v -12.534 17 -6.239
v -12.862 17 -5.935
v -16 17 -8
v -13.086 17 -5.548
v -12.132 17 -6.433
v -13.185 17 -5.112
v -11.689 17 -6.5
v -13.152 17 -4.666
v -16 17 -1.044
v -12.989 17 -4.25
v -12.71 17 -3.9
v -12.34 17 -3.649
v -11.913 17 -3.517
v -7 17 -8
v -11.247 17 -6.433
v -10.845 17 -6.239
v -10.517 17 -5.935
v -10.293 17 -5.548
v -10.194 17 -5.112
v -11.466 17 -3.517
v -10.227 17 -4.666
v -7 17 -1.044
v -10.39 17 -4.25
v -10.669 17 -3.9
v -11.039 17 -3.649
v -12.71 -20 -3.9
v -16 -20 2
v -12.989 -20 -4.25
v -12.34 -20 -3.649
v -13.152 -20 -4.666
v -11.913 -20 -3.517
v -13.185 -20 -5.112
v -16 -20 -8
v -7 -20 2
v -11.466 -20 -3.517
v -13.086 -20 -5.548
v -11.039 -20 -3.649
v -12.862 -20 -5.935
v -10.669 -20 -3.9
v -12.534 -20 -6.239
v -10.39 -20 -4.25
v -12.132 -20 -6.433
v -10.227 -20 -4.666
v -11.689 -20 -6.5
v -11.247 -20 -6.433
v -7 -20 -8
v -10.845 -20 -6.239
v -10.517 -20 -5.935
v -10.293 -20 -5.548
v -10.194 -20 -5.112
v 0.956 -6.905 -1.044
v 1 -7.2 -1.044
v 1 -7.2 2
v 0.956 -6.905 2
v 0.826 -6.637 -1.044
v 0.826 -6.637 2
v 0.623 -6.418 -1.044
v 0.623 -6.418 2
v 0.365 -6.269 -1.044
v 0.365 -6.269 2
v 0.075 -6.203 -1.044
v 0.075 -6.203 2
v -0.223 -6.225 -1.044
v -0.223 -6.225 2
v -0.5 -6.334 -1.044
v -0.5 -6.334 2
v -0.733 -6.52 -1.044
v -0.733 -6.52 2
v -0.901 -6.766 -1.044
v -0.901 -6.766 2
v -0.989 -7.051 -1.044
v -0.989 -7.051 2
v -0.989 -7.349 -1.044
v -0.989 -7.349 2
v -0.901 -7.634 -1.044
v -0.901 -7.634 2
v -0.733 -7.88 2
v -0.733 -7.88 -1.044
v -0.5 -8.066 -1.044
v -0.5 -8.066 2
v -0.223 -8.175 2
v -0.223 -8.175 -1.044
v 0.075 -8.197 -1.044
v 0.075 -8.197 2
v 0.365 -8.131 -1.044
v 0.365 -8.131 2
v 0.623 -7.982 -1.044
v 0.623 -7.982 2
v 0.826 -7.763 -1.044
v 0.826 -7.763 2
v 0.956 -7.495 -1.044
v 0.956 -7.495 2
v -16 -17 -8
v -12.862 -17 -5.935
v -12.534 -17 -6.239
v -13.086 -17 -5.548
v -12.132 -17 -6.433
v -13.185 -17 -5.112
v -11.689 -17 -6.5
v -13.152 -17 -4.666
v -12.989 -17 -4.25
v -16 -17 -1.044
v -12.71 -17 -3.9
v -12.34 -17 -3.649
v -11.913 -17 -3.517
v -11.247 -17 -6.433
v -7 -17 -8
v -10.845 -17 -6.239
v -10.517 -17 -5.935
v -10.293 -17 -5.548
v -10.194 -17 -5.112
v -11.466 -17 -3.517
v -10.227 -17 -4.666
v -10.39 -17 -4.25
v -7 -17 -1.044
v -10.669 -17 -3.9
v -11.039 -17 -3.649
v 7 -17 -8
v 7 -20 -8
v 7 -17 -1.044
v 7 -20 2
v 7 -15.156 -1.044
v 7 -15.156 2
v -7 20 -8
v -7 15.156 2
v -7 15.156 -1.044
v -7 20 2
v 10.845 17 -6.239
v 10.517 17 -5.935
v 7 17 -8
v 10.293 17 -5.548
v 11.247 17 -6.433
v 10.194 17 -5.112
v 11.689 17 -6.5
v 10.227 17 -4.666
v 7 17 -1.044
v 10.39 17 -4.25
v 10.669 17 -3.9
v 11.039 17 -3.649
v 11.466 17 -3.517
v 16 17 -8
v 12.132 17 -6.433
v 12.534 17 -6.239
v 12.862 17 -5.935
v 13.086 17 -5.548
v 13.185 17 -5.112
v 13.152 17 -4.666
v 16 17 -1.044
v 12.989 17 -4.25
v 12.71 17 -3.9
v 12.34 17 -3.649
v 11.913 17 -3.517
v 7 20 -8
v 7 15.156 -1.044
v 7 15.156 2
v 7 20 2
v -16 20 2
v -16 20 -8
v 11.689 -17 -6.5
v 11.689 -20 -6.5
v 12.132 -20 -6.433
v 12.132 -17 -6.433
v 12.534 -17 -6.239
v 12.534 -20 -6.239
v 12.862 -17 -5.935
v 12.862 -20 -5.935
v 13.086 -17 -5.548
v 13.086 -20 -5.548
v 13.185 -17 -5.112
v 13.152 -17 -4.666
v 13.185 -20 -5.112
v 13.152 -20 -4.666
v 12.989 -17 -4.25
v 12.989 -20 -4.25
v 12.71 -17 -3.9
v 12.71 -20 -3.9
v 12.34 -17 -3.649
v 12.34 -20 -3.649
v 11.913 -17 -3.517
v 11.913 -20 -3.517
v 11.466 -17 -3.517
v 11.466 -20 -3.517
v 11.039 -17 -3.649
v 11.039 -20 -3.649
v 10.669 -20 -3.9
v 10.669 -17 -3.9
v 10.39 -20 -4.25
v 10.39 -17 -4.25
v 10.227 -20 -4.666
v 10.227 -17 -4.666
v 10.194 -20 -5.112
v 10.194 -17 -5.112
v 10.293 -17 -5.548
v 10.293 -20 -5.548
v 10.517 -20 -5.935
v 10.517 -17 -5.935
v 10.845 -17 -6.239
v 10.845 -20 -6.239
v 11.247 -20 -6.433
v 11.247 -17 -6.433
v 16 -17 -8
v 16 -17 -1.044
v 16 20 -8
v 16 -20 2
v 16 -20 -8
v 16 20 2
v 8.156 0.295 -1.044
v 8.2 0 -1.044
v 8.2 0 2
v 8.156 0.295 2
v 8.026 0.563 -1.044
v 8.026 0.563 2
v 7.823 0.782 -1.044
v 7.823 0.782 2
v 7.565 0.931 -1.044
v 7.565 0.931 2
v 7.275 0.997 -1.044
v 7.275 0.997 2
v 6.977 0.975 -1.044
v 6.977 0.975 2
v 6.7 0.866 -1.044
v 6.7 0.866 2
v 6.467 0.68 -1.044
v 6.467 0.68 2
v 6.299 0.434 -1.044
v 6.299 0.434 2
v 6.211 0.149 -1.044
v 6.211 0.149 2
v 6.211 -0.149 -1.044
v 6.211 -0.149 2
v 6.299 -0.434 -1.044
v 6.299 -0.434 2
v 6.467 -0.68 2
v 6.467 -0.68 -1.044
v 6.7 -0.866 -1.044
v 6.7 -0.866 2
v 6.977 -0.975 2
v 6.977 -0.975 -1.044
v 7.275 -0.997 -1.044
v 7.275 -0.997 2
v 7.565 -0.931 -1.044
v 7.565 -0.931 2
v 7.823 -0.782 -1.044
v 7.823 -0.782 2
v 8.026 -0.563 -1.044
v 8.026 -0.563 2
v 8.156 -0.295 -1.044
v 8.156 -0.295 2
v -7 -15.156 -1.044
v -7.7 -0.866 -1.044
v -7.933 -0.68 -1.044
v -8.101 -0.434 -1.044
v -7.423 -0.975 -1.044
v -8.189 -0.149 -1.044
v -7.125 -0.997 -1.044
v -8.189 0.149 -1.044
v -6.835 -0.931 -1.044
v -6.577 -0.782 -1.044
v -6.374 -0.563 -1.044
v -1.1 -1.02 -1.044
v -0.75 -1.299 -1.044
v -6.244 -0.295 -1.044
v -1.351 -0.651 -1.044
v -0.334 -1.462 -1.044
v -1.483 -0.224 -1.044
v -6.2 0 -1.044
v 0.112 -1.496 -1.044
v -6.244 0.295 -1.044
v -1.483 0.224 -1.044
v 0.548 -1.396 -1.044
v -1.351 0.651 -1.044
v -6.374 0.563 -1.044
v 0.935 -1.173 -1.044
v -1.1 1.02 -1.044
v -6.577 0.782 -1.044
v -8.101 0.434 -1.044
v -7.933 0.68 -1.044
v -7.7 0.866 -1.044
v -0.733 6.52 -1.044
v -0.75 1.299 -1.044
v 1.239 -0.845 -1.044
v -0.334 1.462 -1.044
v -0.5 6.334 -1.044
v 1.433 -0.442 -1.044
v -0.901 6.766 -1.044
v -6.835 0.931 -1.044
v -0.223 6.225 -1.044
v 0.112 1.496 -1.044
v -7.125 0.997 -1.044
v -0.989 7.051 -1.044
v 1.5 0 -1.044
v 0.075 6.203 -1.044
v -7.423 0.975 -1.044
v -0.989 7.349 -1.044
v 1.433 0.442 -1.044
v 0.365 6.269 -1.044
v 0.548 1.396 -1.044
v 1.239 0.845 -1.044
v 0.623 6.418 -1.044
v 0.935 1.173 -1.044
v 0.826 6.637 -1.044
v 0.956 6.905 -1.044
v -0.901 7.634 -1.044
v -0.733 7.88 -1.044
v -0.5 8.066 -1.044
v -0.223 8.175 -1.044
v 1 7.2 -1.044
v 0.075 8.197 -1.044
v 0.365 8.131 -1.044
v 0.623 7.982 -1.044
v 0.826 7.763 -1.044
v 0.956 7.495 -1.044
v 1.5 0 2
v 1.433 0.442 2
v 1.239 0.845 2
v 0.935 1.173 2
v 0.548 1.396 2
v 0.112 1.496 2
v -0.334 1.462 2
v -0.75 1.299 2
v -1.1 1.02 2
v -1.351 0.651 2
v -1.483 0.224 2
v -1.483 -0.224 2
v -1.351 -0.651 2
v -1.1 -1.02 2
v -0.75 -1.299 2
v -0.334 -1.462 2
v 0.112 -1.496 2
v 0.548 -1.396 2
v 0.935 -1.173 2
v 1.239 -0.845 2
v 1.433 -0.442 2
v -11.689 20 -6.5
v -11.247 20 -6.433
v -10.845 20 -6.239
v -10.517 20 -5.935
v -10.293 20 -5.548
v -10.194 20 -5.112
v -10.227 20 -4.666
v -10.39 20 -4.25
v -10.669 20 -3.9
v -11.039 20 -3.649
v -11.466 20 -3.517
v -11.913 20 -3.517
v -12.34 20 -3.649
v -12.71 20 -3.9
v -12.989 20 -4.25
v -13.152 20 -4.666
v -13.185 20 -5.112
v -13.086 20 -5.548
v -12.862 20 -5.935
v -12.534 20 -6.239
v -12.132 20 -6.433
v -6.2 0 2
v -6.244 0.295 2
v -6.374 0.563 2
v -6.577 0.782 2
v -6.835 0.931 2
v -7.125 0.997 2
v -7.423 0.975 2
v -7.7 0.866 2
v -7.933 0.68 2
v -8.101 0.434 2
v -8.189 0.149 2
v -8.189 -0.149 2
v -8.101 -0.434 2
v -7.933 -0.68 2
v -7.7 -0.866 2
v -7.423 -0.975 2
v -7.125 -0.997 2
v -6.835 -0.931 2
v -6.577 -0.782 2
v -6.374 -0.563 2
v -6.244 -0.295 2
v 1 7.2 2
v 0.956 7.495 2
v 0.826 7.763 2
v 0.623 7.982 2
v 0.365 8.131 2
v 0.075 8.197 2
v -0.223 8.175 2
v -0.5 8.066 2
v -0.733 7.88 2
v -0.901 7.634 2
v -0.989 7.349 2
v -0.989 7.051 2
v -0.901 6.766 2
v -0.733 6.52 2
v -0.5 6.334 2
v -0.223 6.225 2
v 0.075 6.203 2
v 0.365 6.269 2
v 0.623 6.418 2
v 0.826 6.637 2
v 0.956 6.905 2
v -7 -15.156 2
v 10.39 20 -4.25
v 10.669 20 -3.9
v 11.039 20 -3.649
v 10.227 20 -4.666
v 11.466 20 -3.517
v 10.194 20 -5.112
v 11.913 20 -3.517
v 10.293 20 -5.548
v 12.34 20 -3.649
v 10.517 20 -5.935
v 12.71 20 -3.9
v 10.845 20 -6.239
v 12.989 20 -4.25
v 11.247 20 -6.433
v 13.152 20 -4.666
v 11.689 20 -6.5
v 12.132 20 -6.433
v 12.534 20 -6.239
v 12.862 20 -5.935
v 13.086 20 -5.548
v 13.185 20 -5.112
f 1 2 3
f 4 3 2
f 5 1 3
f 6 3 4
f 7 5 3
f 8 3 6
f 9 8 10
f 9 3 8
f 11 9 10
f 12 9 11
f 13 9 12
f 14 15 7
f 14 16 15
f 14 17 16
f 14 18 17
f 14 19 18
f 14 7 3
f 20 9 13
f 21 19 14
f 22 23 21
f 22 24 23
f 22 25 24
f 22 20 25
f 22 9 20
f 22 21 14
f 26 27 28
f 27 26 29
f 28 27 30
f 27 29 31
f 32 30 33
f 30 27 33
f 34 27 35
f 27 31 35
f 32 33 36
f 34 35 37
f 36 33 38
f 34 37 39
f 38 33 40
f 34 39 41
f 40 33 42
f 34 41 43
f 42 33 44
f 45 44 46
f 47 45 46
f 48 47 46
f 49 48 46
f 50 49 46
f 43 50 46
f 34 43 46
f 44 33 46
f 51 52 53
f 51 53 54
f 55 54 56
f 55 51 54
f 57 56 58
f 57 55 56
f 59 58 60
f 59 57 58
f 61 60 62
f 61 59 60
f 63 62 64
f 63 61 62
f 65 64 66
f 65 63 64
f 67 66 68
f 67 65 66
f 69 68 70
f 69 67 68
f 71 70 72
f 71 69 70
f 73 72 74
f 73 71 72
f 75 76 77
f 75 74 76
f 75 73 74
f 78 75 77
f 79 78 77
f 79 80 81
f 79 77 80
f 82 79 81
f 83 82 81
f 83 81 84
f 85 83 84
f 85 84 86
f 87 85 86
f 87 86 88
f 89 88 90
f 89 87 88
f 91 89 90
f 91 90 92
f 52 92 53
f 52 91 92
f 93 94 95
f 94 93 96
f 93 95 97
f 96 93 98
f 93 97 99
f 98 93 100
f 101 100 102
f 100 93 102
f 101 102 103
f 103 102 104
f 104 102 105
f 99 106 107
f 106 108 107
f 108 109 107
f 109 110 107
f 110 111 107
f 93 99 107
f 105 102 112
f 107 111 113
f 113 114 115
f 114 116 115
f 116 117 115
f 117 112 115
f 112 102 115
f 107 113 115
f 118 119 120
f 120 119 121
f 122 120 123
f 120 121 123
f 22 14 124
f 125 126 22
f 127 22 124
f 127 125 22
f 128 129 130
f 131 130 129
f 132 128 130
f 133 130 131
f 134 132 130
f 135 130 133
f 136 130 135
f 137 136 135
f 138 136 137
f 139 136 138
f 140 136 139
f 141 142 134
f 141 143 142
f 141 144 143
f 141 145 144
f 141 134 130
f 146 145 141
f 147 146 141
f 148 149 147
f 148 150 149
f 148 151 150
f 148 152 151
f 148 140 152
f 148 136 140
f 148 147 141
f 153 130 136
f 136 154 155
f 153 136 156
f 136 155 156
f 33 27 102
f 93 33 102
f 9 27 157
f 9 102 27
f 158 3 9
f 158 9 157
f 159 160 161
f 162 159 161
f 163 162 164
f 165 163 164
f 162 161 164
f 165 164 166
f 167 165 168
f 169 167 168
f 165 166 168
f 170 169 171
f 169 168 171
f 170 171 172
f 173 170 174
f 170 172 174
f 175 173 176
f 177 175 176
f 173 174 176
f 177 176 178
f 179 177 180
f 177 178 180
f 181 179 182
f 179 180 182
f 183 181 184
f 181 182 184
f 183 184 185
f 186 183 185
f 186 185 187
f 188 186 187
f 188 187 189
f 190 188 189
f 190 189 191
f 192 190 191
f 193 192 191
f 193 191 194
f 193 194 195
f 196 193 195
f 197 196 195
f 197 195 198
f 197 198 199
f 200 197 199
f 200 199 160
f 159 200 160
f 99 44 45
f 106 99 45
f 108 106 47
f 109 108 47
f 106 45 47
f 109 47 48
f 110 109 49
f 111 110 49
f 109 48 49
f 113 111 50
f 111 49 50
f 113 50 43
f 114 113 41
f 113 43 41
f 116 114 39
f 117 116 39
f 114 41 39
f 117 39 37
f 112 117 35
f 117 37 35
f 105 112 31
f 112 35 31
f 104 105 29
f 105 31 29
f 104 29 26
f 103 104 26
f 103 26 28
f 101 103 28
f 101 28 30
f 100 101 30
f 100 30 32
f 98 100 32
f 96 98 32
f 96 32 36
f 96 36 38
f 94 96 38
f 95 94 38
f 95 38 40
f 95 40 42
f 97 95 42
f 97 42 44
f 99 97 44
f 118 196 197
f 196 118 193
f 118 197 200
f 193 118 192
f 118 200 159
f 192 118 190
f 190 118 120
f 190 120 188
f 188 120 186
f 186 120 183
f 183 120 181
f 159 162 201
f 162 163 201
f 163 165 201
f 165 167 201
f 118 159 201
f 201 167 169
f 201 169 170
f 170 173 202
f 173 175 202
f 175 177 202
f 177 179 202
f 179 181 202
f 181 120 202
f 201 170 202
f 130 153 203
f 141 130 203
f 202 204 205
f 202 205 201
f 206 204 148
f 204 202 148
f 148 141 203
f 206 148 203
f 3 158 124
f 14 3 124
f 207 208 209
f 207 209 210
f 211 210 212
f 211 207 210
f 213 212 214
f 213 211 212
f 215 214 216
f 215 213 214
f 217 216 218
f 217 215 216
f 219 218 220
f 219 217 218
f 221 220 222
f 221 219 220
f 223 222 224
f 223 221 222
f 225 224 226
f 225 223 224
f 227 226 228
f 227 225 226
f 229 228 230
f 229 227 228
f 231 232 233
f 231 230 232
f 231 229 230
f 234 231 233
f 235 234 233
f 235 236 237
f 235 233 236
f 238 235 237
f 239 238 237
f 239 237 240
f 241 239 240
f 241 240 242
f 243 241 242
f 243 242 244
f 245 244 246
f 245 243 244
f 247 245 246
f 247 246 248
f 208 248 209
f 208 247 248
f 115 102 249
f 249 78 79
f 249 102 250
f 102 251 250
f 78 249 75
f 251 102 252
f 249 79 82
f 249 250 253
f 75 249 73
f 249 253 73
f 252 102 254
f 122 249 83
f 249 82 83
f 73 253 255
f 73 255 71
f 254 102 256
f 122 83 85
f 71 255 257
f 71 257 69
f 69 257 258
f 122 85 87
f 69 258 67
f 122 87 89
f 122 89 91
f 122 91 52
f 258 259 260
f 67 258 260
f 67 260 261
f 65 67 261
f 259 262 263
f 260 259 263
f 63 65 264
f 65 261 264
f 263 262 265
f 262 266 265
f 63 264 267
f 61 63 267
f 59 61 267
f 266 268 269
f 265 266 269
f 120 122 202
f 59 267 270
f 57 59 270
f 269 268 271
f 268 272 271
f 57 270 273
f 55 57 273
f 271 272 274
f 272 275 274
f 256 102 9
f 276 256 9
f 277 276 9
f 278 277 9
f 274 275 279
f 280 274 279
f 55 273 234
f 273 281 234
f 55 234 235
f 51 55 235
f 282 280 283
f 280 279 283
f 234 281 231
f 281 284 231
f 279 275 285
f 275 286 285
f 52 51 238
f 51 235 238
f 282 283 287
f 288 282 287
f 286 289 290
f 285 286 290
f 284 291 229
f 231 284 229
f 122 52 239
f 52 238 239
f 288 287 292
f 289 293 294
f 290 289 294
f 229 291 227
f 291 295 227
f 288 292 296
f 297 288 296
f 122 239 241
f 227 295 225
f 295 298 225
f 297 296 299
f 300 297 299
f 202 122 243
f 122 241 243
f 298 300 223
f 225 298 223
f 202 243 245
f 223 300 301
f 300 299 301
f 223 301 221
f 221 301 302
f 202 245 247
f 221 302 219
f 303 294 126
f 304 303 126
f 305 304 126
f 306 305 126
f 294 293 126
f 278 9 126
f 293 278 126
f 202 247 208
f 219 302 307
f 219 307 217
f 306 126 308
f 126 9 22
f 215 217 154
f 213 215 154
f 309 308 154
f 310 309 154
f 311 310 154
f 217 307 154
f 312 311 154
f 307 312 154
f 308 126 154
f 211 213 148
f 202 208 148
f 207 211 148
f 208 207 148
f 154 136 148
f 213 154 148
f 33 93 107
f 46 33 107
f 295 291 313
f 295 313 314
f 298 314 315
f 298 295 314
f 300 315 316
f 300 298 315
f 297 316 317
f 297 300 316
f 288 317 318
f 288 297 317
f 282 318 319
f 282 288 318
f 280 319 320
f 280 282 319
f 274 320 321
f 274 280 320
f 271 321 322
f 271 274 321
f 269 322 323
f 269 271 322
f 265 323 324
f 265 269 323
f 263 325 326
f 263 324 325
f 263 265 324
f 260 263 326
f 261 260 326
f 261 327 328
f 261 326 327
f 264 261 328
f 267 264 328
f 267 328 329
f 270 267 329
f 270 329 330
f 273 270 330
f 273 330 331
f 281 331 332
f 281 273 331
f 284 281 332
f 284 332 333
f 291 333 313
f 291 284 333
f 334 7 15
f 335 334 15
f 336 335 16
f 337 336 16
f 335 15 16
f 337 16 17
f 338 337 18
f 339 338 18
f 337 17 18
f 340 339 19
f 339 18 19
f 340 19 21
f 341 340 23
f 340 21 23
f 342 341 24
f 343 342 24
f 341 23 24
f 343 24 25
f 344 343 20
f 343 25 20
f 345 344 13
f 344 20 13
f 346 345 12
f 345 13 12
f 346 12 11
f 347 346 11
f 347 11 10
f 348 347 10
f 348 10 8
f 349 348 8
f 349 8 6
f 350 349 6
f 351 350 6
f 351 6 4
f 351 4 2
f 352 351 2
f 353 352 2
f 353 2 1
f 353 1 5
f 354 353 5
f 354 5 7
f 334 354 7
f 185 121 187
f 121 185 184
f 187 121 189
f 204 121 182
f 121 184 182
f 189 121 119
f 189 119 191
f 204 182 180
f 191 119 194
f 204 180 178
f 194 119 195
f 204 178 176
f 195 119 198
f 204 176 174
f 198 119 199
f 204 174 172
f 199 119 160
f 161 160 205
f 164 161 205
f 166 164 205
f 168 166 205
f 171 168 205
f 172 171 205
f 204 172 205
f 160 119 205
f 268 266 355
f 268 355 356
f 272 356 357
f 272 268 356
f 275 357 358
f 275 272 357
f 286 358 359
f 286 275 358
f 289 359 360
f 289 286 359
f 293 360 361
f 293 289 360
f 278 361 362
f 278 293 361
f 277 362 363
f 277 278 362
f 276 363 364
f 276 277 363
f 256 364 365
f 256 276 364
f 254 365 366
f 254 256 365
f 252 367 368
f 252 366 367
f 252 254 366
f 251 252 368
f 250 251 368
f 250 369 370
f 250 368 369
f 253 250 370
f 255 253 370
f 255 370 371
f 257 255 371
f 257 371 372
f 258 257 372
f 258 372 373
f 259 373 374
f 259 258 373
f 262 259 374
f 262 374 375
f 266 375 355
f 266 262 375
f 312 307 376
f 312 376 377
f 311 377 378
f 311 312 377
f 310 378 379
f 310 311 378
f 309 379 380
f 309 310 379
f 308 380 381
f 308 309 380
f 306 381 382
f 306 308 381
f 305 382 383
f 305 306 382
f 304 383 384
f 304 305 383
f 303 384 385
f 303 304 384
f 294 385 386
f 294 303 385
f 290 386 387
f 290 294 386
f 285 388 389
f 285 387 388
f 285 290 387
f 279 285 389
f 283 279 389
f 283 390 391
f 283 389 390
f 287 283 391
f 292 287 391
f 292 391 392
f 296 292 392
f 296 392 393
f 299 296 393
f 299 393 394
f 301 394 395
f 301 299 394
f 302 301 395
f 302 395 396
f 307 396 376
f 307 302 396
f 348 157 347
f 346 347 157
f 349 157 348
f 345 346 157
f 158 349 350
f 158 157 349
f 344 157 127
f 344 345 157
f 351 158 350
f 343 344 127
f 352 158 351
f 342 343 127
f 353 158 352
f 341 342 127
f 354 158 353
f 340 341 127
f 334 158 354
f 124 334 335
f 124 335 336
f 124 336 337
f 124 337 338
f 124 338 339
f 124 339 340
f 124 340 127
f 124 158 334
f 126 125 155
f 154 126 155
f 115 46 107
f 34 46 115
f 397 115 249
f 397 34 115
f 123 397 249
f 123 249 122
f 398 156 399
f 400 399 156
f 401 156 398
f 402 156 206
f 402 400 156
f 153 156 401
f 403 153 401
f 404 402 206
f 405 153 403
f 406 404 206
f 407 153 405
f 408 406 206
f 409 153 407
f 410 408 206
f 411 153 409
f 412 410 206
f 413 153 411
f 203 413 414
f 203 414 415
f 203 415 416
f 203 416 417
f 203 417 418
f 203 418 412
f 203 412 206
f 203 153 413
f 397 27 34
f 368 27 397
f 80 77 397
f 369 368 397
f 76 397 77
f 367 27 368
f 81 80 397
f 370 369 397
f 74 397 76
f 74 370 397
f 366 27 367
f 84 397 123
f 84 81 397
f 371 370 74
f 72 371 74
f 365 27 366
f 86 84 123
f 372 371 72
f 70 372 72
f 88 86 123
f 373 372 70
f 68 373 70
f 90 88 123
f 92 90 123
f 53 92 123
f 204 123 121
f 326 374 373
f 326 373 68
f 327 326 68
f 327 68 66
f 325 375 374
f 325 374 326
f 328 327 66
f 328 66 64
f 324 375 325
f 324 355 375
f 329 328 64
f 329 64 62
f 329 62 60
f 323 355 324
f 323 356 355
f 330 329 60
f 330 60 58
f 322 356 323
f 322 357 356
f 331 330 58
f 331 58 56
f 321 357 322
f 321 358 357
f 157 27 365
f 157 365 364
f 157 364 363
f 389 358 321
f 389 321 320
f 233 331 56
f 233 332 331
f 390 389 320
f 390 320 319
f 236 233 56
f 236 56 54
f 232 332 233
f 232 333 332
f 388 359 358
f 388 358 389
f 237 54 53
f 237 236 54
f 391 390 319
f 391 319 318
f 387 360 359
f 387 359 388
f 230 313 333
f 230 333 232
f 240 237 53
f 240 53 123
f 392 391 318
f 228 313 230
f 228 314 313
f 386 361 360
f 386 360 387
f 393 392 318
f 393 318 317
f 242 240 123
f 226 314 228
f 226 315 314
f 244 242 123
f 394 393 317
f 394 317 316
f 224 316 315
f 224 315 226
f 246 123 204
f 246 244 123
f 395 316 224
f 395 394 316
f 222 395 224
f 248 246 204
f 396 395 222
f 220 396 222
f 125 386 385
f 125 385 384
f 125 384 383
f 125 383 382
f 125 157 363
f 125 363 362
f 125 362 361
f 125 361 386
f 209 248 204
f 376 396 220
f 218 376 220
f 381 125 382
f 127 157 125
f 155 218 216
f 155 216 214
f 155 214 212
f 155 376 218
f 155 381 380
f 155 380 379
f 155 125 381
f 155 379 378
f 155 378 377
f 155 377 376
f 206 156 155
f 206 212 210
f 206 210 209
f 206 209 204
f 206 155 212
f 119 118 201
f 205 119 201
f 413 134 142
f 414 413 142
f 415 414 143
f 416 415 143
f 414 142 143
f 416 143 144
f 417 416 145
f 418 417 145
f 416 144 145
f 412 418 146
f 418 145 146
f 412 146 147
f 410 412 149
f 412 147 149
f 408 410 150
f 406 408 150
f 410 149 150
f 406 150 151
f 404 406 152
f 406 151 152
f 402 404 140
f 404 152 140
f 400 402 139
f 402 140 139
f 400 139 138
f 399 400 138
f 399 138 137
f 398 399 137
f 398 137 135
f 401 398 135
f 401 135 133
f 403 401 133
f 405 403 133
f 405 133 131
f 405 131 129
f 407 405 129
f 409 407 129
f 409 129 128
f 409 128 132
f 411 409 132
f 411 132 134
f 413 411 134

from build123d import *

# Parameters (mm, degrees)
BOSS_EXTRUDE1_DEPTH      = 2
BOSS_EXTRUDE1_DEPTH_BACK = 1.043576075
SKETCH1_W                = 32
SKETCH1_H                = 40
CUT_EXTRUDE3_DEPTH       = 26.792699652
CUT_EXTRUDE3_DEPTH_BACK  = 26.792699652
SKETCH5_R                = 1.5
SKETCH5_R_2              = 1
SKETCH_4_W               = 14
SKETCH_4_H               = 4.843949414
CUT_EXTRUDE_3_DEPTH      = 26.792699652
SKETCH_5_W               = 9
SKETCH_5_H               = 3
EXTRUDE_3_DEPTH          = 10
SKETCH_6_R               = 1.5
CUT_EXTRUDE_5_DEPTH      = 44.8178046


with BuildPart() as part:
    # Sketch1 → Boss-Extrude1 (new, two sides: drawn at the far end of the back side and taken through both)
    with BuildSketch(Plane.XY.offset(-BOSS_EXTRUDE1_DEPTH_BACK)):
        Rectangle(SKETCH1_W, SKETCH1_H)
    extrude(amount=BOSS_EXTRUDE1_DEPTH + BOSS_EXTRUDE1_DEPTH_BACK)

    # Sketch5 → Cut-Extrude3 (cut, two sides: drawn at the far end of the back side and taken through both)
    with BuildSketch(Plane.XY.offset(2).offset(-CUT_EXTRUDE3_DEPTH_BACK)):
        Circle(SKETCH5_R)
        with Locations((0, 7.2)):
            Circle(SKETCH5_R_2)
        with Locations((7.2, 0)):
            Circle(SKETCH5_R_2)
        with Locations((0, -7.2)):
            Circle(SKETCH5_R_2)
        with Locations((-7.2, 0)):
            Circle(SKETCH5_R_2)
    extrude(amount=CUT_EXTRUDE3_DEPTH + CUT_EXTRUDE3_DEPTH_BACK, mode=Mode.SUBTRACT)

    # 草图4 → 切除-拉伸3 (cut, through all)
    with BuildSketch(Plane.XY.offset(2)):
        with Locations((0, 17.578025293)):
            Rectangle(SKETCH_4_W, SKETCH_4_H)
        with Locations((0, -17.578025293)):
            Rectangle(SKETCH_4_W, SKETCH_4_H)
    extrude(amount=-CUT_EXTRUDE_3_DEPTH, mode=Mode.SUBTRACT)

    # 草图5 → 凸台-拉伸3 (add)
    with BuildSketch(Plane.XY.offset(2)):
        with Locations((11.5, 18.5)):
            Rectangle(SKETCH_5_W, SKETCH_5_H)
        with Locations((-11.5, 18.5)):
            Rectangle(SKETCH_5_W, SKETCH_5_H)
        with Locations((-11.5, -18.5)):
            Rectangle(SKETCH_5_W, SKETCH_5_H)
        with Locations((11.5, -18.5)):
            Rectangle(SKETCH_5_W, SKETCH_5_H)
    extrude(amount=-EXTRUDE_3_DEPTH)

    # 草图6 → 切除-拉伸5 (cut, through all)
    with BuildSketch(Plane.XZ.offset(20)):
        with Locations(Location((11.6894988, -5, 0), (0, 0, 270))):
            Circle(SKETCH_6_R)
        with Locations(Location((-11.6894988, -5, 0), (0, 0, 270))):
            Circle(SKETCH_6_R)
    extrude(amount=-CUT_EXTRUDE_5_DEPTH, mode=Mode.SUBTRACT)


solid = part.part
